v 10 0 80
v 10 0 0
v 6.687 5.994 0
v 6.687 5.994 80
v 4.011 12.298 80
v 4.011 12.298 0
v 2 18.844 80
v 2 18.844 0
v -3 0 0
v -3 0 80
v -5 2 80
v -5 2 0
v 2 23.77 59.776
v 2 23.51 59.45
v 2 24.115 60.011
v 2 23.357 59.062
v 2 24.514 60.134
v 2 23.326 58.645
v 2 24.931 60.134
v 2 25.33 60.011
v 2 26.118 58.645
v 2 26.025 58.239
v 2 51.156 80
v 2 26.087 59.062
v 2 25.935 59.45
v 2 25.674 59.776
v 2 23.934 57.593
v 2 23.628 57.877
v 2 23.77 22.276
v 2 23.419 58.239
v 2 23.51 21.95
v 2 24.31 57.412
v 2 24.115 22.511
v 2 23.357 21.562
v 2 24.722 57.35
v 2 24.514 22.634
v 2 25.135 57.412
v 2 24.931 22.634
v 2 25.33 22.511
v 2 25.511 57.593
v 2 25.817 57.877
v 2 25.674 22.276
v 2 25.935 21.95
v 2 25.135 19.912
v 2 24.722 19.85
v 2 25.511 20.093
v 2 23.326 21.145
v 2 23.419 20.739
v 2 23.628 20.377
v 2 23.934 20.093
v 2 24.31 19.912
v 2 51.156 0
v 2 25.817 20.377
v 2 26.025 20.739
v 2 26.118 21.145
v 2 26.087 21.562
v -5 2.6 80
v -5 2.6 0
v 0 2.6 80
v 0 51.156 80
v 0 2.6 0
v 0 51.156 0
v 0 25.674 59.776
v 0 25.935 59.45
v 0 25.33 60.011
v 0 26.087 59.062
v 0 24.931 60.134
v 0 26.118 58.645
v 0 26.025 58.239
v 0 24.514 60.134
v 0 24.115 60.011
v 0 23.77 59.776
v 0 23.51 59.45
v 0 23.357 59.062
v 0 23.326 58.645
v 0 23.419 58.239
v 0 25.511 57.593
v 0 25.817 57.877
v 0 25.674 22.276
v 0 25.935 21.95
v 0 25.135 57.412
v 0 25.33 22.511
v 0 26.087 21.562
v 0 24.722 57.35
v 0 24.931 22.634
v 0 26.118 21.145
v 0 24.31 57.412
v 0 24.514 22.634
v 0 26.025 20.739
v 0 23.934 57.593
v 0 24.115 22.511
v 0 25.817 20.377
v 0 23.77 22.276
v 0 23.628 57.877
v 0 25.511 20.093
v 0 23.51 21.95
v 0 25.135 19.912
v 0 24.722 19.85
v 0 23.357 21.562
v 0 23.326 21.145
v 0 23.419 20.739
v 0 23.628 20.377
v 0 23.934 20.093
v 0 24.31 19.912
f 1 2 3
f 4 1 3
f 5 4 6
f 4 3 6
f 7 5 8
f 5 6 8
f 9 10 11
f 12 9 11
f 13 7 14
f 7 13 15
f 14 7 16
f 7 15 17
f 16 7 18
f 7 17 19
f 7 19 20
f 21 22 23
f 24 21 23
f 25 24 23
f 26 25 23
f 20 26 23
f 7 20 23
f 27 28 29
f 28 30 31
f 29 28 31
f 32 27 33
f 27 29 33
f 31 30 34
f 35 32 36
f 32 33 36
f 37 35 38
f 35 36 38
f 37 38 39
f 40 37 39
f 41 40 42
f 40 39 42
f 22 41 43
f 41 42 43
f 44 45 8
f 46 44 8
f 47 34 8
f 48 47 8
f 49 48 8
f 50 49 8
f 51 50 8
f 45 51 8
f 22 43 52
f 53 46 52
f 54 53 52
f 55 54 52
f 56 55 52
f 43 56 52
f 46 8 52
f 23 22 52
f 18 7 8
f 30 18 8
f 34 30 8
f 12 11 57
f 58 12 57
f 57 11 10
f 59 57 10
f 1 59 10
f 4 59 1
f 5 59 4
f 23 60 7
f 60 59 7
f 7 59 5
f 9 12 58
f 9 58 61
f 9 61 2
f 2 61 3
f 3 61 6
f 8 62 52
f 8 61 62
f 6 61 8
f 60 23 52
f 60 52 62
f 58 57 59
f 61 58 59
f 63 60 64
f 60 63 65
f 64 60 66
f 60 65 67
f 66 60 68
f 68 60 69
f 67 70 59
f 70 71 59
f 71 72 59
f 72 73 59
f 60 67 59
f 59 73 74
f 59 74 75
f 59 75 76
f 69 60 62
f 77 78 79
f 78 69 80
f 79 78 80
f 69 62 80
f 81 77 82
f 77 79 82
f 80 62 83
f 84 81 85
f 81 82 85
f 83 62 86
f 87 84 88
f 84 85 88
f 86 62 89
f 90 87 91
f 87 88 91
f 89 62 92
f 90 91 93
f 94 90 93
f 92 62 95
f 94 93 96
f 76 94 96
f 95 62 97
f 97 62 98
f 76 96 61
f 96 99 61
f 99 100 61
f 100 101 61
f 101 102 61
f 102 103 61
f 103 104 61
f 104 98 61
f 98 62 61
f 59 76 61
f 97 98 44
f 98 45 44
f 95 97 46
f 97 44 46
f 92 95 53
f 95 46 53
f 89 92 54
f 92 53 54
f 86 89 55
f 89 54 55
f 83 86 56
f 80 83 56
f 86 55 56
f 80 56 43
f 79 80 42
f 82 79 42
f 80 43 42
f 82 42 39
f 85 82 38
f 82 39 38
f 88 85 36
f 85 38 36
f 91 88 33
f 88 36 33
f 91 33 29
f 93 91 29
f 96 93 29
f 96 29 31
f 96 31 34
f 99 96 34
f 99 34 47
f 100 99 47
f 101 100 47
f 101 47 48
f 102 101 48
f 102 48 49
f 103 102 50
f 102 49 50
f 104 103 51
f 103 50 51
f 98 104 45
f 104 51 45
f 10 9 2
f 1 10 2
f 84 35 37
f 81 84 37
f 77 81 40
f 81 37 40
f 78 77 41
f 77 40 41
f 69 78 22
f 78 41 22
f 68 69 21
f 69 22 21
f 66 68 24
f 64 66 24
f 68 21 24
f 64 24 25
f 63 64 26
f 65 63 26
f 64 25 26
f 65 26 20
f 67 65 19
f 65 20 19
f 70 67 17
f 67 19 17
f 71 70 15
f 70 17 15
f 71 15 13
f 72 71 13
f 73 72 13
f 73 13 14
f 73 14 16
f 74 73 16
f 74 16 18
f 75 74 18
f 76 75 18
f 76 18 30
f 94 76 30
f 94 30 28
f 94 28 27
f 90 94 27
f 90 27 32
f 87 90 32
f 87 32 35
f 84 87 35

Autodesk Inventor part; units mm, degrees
ref_plane "YZ Plane" through (0, 0, 0) normal (1, 0, 0) x (0, 1, 0)
ref_plane "XZ Plane" through (0, 0, 0) normal (0, 1, 0) x (-1, 0, 0)
ref_plane "XY Plane" through (0, 0, 0) normal (0, 0, 1) x (1, 0, 0)
sketch "Esboço1" plane through (0, 0, 0) normal (0, 0, 1) x (1, 0, 0)
  line L0 (0, 0) -> (10, 0)
  line L1 (0, 51.1555) -> (0, 0)
  line L2 (2, 35) -> (2, 18.8445)
  line L3 (2, 35) -> (2, 51.1555)
  arc A0 (2, 18.8445) -> (10, 0) centre (66.25, 35) ccw
  line L4 (2, 51.1555) -> (0, 51.1555)
extrude "Extrusão1" add sketch "Esboço1" along normal blind 80
sketch "Esboço2" plane through (0, 0, 80) normal (0, 0, 1) x (1, 0, 0)
  line L0 (0, 0) -> (10, 0) projected
  line L1 (0, 0) -> (-3, 0)
  line L2 (-5, 2) -> (-5, 2.6)
  line L3 (-5, 2.6) -> (0, 2.6)
  line L4 (-3, 0) -> (-5, 2)
  line L5 (0, 51.1555) -> (0, 0) projected
  line L6 (0, 2.6) -> (0, 0)
  point P0 (-5, 0)
  dimension "d5" = 5
  dimension "d6" = 2.6
  dimension "d7" = 2
  dimension "d8" = 2
extrude "Extrusão2" add sketch "Esboço2" against normal blind 80
sketch "Esboço3" plane through (2, 18.8445, 0) normal (1, 0, 0) x (0, 0, -1)
  line L0 (0, 0) -> (-80, 0) projected
  line L1 (-2.5, 11.7555) -> (-77.5, 11.7555) projected
  line L2 (-2.5, 11.7555) -> (-2.5, -13.7445) projected
  line L3 (-77.5, -13.7445) -> (-2.5, -13.7445) projected
  line L4 (-77.5, 11.7555) -> (-77.5, -13.7445) projected
  line L5 (-77.5, 11.7555) -> (-40, 0) construction
  line L6 (-40, 0) -> (-2.5, 11.7555) construction
  circle A0 centre (-58.75, 5.8777) radius 1.4
  circle A1 centre (-21.25, 5.8777) radius 1.4
  point P0 (0, -18.8445)
  dimension "d11" = 2.8
  dimension "d12" = 2.8
extrude "Extrusão3" cut sketch "Esboço3" against normal blind 80 contours A0 | A1
equation "\"d8\" = d7"
properties part number "Rampa"
